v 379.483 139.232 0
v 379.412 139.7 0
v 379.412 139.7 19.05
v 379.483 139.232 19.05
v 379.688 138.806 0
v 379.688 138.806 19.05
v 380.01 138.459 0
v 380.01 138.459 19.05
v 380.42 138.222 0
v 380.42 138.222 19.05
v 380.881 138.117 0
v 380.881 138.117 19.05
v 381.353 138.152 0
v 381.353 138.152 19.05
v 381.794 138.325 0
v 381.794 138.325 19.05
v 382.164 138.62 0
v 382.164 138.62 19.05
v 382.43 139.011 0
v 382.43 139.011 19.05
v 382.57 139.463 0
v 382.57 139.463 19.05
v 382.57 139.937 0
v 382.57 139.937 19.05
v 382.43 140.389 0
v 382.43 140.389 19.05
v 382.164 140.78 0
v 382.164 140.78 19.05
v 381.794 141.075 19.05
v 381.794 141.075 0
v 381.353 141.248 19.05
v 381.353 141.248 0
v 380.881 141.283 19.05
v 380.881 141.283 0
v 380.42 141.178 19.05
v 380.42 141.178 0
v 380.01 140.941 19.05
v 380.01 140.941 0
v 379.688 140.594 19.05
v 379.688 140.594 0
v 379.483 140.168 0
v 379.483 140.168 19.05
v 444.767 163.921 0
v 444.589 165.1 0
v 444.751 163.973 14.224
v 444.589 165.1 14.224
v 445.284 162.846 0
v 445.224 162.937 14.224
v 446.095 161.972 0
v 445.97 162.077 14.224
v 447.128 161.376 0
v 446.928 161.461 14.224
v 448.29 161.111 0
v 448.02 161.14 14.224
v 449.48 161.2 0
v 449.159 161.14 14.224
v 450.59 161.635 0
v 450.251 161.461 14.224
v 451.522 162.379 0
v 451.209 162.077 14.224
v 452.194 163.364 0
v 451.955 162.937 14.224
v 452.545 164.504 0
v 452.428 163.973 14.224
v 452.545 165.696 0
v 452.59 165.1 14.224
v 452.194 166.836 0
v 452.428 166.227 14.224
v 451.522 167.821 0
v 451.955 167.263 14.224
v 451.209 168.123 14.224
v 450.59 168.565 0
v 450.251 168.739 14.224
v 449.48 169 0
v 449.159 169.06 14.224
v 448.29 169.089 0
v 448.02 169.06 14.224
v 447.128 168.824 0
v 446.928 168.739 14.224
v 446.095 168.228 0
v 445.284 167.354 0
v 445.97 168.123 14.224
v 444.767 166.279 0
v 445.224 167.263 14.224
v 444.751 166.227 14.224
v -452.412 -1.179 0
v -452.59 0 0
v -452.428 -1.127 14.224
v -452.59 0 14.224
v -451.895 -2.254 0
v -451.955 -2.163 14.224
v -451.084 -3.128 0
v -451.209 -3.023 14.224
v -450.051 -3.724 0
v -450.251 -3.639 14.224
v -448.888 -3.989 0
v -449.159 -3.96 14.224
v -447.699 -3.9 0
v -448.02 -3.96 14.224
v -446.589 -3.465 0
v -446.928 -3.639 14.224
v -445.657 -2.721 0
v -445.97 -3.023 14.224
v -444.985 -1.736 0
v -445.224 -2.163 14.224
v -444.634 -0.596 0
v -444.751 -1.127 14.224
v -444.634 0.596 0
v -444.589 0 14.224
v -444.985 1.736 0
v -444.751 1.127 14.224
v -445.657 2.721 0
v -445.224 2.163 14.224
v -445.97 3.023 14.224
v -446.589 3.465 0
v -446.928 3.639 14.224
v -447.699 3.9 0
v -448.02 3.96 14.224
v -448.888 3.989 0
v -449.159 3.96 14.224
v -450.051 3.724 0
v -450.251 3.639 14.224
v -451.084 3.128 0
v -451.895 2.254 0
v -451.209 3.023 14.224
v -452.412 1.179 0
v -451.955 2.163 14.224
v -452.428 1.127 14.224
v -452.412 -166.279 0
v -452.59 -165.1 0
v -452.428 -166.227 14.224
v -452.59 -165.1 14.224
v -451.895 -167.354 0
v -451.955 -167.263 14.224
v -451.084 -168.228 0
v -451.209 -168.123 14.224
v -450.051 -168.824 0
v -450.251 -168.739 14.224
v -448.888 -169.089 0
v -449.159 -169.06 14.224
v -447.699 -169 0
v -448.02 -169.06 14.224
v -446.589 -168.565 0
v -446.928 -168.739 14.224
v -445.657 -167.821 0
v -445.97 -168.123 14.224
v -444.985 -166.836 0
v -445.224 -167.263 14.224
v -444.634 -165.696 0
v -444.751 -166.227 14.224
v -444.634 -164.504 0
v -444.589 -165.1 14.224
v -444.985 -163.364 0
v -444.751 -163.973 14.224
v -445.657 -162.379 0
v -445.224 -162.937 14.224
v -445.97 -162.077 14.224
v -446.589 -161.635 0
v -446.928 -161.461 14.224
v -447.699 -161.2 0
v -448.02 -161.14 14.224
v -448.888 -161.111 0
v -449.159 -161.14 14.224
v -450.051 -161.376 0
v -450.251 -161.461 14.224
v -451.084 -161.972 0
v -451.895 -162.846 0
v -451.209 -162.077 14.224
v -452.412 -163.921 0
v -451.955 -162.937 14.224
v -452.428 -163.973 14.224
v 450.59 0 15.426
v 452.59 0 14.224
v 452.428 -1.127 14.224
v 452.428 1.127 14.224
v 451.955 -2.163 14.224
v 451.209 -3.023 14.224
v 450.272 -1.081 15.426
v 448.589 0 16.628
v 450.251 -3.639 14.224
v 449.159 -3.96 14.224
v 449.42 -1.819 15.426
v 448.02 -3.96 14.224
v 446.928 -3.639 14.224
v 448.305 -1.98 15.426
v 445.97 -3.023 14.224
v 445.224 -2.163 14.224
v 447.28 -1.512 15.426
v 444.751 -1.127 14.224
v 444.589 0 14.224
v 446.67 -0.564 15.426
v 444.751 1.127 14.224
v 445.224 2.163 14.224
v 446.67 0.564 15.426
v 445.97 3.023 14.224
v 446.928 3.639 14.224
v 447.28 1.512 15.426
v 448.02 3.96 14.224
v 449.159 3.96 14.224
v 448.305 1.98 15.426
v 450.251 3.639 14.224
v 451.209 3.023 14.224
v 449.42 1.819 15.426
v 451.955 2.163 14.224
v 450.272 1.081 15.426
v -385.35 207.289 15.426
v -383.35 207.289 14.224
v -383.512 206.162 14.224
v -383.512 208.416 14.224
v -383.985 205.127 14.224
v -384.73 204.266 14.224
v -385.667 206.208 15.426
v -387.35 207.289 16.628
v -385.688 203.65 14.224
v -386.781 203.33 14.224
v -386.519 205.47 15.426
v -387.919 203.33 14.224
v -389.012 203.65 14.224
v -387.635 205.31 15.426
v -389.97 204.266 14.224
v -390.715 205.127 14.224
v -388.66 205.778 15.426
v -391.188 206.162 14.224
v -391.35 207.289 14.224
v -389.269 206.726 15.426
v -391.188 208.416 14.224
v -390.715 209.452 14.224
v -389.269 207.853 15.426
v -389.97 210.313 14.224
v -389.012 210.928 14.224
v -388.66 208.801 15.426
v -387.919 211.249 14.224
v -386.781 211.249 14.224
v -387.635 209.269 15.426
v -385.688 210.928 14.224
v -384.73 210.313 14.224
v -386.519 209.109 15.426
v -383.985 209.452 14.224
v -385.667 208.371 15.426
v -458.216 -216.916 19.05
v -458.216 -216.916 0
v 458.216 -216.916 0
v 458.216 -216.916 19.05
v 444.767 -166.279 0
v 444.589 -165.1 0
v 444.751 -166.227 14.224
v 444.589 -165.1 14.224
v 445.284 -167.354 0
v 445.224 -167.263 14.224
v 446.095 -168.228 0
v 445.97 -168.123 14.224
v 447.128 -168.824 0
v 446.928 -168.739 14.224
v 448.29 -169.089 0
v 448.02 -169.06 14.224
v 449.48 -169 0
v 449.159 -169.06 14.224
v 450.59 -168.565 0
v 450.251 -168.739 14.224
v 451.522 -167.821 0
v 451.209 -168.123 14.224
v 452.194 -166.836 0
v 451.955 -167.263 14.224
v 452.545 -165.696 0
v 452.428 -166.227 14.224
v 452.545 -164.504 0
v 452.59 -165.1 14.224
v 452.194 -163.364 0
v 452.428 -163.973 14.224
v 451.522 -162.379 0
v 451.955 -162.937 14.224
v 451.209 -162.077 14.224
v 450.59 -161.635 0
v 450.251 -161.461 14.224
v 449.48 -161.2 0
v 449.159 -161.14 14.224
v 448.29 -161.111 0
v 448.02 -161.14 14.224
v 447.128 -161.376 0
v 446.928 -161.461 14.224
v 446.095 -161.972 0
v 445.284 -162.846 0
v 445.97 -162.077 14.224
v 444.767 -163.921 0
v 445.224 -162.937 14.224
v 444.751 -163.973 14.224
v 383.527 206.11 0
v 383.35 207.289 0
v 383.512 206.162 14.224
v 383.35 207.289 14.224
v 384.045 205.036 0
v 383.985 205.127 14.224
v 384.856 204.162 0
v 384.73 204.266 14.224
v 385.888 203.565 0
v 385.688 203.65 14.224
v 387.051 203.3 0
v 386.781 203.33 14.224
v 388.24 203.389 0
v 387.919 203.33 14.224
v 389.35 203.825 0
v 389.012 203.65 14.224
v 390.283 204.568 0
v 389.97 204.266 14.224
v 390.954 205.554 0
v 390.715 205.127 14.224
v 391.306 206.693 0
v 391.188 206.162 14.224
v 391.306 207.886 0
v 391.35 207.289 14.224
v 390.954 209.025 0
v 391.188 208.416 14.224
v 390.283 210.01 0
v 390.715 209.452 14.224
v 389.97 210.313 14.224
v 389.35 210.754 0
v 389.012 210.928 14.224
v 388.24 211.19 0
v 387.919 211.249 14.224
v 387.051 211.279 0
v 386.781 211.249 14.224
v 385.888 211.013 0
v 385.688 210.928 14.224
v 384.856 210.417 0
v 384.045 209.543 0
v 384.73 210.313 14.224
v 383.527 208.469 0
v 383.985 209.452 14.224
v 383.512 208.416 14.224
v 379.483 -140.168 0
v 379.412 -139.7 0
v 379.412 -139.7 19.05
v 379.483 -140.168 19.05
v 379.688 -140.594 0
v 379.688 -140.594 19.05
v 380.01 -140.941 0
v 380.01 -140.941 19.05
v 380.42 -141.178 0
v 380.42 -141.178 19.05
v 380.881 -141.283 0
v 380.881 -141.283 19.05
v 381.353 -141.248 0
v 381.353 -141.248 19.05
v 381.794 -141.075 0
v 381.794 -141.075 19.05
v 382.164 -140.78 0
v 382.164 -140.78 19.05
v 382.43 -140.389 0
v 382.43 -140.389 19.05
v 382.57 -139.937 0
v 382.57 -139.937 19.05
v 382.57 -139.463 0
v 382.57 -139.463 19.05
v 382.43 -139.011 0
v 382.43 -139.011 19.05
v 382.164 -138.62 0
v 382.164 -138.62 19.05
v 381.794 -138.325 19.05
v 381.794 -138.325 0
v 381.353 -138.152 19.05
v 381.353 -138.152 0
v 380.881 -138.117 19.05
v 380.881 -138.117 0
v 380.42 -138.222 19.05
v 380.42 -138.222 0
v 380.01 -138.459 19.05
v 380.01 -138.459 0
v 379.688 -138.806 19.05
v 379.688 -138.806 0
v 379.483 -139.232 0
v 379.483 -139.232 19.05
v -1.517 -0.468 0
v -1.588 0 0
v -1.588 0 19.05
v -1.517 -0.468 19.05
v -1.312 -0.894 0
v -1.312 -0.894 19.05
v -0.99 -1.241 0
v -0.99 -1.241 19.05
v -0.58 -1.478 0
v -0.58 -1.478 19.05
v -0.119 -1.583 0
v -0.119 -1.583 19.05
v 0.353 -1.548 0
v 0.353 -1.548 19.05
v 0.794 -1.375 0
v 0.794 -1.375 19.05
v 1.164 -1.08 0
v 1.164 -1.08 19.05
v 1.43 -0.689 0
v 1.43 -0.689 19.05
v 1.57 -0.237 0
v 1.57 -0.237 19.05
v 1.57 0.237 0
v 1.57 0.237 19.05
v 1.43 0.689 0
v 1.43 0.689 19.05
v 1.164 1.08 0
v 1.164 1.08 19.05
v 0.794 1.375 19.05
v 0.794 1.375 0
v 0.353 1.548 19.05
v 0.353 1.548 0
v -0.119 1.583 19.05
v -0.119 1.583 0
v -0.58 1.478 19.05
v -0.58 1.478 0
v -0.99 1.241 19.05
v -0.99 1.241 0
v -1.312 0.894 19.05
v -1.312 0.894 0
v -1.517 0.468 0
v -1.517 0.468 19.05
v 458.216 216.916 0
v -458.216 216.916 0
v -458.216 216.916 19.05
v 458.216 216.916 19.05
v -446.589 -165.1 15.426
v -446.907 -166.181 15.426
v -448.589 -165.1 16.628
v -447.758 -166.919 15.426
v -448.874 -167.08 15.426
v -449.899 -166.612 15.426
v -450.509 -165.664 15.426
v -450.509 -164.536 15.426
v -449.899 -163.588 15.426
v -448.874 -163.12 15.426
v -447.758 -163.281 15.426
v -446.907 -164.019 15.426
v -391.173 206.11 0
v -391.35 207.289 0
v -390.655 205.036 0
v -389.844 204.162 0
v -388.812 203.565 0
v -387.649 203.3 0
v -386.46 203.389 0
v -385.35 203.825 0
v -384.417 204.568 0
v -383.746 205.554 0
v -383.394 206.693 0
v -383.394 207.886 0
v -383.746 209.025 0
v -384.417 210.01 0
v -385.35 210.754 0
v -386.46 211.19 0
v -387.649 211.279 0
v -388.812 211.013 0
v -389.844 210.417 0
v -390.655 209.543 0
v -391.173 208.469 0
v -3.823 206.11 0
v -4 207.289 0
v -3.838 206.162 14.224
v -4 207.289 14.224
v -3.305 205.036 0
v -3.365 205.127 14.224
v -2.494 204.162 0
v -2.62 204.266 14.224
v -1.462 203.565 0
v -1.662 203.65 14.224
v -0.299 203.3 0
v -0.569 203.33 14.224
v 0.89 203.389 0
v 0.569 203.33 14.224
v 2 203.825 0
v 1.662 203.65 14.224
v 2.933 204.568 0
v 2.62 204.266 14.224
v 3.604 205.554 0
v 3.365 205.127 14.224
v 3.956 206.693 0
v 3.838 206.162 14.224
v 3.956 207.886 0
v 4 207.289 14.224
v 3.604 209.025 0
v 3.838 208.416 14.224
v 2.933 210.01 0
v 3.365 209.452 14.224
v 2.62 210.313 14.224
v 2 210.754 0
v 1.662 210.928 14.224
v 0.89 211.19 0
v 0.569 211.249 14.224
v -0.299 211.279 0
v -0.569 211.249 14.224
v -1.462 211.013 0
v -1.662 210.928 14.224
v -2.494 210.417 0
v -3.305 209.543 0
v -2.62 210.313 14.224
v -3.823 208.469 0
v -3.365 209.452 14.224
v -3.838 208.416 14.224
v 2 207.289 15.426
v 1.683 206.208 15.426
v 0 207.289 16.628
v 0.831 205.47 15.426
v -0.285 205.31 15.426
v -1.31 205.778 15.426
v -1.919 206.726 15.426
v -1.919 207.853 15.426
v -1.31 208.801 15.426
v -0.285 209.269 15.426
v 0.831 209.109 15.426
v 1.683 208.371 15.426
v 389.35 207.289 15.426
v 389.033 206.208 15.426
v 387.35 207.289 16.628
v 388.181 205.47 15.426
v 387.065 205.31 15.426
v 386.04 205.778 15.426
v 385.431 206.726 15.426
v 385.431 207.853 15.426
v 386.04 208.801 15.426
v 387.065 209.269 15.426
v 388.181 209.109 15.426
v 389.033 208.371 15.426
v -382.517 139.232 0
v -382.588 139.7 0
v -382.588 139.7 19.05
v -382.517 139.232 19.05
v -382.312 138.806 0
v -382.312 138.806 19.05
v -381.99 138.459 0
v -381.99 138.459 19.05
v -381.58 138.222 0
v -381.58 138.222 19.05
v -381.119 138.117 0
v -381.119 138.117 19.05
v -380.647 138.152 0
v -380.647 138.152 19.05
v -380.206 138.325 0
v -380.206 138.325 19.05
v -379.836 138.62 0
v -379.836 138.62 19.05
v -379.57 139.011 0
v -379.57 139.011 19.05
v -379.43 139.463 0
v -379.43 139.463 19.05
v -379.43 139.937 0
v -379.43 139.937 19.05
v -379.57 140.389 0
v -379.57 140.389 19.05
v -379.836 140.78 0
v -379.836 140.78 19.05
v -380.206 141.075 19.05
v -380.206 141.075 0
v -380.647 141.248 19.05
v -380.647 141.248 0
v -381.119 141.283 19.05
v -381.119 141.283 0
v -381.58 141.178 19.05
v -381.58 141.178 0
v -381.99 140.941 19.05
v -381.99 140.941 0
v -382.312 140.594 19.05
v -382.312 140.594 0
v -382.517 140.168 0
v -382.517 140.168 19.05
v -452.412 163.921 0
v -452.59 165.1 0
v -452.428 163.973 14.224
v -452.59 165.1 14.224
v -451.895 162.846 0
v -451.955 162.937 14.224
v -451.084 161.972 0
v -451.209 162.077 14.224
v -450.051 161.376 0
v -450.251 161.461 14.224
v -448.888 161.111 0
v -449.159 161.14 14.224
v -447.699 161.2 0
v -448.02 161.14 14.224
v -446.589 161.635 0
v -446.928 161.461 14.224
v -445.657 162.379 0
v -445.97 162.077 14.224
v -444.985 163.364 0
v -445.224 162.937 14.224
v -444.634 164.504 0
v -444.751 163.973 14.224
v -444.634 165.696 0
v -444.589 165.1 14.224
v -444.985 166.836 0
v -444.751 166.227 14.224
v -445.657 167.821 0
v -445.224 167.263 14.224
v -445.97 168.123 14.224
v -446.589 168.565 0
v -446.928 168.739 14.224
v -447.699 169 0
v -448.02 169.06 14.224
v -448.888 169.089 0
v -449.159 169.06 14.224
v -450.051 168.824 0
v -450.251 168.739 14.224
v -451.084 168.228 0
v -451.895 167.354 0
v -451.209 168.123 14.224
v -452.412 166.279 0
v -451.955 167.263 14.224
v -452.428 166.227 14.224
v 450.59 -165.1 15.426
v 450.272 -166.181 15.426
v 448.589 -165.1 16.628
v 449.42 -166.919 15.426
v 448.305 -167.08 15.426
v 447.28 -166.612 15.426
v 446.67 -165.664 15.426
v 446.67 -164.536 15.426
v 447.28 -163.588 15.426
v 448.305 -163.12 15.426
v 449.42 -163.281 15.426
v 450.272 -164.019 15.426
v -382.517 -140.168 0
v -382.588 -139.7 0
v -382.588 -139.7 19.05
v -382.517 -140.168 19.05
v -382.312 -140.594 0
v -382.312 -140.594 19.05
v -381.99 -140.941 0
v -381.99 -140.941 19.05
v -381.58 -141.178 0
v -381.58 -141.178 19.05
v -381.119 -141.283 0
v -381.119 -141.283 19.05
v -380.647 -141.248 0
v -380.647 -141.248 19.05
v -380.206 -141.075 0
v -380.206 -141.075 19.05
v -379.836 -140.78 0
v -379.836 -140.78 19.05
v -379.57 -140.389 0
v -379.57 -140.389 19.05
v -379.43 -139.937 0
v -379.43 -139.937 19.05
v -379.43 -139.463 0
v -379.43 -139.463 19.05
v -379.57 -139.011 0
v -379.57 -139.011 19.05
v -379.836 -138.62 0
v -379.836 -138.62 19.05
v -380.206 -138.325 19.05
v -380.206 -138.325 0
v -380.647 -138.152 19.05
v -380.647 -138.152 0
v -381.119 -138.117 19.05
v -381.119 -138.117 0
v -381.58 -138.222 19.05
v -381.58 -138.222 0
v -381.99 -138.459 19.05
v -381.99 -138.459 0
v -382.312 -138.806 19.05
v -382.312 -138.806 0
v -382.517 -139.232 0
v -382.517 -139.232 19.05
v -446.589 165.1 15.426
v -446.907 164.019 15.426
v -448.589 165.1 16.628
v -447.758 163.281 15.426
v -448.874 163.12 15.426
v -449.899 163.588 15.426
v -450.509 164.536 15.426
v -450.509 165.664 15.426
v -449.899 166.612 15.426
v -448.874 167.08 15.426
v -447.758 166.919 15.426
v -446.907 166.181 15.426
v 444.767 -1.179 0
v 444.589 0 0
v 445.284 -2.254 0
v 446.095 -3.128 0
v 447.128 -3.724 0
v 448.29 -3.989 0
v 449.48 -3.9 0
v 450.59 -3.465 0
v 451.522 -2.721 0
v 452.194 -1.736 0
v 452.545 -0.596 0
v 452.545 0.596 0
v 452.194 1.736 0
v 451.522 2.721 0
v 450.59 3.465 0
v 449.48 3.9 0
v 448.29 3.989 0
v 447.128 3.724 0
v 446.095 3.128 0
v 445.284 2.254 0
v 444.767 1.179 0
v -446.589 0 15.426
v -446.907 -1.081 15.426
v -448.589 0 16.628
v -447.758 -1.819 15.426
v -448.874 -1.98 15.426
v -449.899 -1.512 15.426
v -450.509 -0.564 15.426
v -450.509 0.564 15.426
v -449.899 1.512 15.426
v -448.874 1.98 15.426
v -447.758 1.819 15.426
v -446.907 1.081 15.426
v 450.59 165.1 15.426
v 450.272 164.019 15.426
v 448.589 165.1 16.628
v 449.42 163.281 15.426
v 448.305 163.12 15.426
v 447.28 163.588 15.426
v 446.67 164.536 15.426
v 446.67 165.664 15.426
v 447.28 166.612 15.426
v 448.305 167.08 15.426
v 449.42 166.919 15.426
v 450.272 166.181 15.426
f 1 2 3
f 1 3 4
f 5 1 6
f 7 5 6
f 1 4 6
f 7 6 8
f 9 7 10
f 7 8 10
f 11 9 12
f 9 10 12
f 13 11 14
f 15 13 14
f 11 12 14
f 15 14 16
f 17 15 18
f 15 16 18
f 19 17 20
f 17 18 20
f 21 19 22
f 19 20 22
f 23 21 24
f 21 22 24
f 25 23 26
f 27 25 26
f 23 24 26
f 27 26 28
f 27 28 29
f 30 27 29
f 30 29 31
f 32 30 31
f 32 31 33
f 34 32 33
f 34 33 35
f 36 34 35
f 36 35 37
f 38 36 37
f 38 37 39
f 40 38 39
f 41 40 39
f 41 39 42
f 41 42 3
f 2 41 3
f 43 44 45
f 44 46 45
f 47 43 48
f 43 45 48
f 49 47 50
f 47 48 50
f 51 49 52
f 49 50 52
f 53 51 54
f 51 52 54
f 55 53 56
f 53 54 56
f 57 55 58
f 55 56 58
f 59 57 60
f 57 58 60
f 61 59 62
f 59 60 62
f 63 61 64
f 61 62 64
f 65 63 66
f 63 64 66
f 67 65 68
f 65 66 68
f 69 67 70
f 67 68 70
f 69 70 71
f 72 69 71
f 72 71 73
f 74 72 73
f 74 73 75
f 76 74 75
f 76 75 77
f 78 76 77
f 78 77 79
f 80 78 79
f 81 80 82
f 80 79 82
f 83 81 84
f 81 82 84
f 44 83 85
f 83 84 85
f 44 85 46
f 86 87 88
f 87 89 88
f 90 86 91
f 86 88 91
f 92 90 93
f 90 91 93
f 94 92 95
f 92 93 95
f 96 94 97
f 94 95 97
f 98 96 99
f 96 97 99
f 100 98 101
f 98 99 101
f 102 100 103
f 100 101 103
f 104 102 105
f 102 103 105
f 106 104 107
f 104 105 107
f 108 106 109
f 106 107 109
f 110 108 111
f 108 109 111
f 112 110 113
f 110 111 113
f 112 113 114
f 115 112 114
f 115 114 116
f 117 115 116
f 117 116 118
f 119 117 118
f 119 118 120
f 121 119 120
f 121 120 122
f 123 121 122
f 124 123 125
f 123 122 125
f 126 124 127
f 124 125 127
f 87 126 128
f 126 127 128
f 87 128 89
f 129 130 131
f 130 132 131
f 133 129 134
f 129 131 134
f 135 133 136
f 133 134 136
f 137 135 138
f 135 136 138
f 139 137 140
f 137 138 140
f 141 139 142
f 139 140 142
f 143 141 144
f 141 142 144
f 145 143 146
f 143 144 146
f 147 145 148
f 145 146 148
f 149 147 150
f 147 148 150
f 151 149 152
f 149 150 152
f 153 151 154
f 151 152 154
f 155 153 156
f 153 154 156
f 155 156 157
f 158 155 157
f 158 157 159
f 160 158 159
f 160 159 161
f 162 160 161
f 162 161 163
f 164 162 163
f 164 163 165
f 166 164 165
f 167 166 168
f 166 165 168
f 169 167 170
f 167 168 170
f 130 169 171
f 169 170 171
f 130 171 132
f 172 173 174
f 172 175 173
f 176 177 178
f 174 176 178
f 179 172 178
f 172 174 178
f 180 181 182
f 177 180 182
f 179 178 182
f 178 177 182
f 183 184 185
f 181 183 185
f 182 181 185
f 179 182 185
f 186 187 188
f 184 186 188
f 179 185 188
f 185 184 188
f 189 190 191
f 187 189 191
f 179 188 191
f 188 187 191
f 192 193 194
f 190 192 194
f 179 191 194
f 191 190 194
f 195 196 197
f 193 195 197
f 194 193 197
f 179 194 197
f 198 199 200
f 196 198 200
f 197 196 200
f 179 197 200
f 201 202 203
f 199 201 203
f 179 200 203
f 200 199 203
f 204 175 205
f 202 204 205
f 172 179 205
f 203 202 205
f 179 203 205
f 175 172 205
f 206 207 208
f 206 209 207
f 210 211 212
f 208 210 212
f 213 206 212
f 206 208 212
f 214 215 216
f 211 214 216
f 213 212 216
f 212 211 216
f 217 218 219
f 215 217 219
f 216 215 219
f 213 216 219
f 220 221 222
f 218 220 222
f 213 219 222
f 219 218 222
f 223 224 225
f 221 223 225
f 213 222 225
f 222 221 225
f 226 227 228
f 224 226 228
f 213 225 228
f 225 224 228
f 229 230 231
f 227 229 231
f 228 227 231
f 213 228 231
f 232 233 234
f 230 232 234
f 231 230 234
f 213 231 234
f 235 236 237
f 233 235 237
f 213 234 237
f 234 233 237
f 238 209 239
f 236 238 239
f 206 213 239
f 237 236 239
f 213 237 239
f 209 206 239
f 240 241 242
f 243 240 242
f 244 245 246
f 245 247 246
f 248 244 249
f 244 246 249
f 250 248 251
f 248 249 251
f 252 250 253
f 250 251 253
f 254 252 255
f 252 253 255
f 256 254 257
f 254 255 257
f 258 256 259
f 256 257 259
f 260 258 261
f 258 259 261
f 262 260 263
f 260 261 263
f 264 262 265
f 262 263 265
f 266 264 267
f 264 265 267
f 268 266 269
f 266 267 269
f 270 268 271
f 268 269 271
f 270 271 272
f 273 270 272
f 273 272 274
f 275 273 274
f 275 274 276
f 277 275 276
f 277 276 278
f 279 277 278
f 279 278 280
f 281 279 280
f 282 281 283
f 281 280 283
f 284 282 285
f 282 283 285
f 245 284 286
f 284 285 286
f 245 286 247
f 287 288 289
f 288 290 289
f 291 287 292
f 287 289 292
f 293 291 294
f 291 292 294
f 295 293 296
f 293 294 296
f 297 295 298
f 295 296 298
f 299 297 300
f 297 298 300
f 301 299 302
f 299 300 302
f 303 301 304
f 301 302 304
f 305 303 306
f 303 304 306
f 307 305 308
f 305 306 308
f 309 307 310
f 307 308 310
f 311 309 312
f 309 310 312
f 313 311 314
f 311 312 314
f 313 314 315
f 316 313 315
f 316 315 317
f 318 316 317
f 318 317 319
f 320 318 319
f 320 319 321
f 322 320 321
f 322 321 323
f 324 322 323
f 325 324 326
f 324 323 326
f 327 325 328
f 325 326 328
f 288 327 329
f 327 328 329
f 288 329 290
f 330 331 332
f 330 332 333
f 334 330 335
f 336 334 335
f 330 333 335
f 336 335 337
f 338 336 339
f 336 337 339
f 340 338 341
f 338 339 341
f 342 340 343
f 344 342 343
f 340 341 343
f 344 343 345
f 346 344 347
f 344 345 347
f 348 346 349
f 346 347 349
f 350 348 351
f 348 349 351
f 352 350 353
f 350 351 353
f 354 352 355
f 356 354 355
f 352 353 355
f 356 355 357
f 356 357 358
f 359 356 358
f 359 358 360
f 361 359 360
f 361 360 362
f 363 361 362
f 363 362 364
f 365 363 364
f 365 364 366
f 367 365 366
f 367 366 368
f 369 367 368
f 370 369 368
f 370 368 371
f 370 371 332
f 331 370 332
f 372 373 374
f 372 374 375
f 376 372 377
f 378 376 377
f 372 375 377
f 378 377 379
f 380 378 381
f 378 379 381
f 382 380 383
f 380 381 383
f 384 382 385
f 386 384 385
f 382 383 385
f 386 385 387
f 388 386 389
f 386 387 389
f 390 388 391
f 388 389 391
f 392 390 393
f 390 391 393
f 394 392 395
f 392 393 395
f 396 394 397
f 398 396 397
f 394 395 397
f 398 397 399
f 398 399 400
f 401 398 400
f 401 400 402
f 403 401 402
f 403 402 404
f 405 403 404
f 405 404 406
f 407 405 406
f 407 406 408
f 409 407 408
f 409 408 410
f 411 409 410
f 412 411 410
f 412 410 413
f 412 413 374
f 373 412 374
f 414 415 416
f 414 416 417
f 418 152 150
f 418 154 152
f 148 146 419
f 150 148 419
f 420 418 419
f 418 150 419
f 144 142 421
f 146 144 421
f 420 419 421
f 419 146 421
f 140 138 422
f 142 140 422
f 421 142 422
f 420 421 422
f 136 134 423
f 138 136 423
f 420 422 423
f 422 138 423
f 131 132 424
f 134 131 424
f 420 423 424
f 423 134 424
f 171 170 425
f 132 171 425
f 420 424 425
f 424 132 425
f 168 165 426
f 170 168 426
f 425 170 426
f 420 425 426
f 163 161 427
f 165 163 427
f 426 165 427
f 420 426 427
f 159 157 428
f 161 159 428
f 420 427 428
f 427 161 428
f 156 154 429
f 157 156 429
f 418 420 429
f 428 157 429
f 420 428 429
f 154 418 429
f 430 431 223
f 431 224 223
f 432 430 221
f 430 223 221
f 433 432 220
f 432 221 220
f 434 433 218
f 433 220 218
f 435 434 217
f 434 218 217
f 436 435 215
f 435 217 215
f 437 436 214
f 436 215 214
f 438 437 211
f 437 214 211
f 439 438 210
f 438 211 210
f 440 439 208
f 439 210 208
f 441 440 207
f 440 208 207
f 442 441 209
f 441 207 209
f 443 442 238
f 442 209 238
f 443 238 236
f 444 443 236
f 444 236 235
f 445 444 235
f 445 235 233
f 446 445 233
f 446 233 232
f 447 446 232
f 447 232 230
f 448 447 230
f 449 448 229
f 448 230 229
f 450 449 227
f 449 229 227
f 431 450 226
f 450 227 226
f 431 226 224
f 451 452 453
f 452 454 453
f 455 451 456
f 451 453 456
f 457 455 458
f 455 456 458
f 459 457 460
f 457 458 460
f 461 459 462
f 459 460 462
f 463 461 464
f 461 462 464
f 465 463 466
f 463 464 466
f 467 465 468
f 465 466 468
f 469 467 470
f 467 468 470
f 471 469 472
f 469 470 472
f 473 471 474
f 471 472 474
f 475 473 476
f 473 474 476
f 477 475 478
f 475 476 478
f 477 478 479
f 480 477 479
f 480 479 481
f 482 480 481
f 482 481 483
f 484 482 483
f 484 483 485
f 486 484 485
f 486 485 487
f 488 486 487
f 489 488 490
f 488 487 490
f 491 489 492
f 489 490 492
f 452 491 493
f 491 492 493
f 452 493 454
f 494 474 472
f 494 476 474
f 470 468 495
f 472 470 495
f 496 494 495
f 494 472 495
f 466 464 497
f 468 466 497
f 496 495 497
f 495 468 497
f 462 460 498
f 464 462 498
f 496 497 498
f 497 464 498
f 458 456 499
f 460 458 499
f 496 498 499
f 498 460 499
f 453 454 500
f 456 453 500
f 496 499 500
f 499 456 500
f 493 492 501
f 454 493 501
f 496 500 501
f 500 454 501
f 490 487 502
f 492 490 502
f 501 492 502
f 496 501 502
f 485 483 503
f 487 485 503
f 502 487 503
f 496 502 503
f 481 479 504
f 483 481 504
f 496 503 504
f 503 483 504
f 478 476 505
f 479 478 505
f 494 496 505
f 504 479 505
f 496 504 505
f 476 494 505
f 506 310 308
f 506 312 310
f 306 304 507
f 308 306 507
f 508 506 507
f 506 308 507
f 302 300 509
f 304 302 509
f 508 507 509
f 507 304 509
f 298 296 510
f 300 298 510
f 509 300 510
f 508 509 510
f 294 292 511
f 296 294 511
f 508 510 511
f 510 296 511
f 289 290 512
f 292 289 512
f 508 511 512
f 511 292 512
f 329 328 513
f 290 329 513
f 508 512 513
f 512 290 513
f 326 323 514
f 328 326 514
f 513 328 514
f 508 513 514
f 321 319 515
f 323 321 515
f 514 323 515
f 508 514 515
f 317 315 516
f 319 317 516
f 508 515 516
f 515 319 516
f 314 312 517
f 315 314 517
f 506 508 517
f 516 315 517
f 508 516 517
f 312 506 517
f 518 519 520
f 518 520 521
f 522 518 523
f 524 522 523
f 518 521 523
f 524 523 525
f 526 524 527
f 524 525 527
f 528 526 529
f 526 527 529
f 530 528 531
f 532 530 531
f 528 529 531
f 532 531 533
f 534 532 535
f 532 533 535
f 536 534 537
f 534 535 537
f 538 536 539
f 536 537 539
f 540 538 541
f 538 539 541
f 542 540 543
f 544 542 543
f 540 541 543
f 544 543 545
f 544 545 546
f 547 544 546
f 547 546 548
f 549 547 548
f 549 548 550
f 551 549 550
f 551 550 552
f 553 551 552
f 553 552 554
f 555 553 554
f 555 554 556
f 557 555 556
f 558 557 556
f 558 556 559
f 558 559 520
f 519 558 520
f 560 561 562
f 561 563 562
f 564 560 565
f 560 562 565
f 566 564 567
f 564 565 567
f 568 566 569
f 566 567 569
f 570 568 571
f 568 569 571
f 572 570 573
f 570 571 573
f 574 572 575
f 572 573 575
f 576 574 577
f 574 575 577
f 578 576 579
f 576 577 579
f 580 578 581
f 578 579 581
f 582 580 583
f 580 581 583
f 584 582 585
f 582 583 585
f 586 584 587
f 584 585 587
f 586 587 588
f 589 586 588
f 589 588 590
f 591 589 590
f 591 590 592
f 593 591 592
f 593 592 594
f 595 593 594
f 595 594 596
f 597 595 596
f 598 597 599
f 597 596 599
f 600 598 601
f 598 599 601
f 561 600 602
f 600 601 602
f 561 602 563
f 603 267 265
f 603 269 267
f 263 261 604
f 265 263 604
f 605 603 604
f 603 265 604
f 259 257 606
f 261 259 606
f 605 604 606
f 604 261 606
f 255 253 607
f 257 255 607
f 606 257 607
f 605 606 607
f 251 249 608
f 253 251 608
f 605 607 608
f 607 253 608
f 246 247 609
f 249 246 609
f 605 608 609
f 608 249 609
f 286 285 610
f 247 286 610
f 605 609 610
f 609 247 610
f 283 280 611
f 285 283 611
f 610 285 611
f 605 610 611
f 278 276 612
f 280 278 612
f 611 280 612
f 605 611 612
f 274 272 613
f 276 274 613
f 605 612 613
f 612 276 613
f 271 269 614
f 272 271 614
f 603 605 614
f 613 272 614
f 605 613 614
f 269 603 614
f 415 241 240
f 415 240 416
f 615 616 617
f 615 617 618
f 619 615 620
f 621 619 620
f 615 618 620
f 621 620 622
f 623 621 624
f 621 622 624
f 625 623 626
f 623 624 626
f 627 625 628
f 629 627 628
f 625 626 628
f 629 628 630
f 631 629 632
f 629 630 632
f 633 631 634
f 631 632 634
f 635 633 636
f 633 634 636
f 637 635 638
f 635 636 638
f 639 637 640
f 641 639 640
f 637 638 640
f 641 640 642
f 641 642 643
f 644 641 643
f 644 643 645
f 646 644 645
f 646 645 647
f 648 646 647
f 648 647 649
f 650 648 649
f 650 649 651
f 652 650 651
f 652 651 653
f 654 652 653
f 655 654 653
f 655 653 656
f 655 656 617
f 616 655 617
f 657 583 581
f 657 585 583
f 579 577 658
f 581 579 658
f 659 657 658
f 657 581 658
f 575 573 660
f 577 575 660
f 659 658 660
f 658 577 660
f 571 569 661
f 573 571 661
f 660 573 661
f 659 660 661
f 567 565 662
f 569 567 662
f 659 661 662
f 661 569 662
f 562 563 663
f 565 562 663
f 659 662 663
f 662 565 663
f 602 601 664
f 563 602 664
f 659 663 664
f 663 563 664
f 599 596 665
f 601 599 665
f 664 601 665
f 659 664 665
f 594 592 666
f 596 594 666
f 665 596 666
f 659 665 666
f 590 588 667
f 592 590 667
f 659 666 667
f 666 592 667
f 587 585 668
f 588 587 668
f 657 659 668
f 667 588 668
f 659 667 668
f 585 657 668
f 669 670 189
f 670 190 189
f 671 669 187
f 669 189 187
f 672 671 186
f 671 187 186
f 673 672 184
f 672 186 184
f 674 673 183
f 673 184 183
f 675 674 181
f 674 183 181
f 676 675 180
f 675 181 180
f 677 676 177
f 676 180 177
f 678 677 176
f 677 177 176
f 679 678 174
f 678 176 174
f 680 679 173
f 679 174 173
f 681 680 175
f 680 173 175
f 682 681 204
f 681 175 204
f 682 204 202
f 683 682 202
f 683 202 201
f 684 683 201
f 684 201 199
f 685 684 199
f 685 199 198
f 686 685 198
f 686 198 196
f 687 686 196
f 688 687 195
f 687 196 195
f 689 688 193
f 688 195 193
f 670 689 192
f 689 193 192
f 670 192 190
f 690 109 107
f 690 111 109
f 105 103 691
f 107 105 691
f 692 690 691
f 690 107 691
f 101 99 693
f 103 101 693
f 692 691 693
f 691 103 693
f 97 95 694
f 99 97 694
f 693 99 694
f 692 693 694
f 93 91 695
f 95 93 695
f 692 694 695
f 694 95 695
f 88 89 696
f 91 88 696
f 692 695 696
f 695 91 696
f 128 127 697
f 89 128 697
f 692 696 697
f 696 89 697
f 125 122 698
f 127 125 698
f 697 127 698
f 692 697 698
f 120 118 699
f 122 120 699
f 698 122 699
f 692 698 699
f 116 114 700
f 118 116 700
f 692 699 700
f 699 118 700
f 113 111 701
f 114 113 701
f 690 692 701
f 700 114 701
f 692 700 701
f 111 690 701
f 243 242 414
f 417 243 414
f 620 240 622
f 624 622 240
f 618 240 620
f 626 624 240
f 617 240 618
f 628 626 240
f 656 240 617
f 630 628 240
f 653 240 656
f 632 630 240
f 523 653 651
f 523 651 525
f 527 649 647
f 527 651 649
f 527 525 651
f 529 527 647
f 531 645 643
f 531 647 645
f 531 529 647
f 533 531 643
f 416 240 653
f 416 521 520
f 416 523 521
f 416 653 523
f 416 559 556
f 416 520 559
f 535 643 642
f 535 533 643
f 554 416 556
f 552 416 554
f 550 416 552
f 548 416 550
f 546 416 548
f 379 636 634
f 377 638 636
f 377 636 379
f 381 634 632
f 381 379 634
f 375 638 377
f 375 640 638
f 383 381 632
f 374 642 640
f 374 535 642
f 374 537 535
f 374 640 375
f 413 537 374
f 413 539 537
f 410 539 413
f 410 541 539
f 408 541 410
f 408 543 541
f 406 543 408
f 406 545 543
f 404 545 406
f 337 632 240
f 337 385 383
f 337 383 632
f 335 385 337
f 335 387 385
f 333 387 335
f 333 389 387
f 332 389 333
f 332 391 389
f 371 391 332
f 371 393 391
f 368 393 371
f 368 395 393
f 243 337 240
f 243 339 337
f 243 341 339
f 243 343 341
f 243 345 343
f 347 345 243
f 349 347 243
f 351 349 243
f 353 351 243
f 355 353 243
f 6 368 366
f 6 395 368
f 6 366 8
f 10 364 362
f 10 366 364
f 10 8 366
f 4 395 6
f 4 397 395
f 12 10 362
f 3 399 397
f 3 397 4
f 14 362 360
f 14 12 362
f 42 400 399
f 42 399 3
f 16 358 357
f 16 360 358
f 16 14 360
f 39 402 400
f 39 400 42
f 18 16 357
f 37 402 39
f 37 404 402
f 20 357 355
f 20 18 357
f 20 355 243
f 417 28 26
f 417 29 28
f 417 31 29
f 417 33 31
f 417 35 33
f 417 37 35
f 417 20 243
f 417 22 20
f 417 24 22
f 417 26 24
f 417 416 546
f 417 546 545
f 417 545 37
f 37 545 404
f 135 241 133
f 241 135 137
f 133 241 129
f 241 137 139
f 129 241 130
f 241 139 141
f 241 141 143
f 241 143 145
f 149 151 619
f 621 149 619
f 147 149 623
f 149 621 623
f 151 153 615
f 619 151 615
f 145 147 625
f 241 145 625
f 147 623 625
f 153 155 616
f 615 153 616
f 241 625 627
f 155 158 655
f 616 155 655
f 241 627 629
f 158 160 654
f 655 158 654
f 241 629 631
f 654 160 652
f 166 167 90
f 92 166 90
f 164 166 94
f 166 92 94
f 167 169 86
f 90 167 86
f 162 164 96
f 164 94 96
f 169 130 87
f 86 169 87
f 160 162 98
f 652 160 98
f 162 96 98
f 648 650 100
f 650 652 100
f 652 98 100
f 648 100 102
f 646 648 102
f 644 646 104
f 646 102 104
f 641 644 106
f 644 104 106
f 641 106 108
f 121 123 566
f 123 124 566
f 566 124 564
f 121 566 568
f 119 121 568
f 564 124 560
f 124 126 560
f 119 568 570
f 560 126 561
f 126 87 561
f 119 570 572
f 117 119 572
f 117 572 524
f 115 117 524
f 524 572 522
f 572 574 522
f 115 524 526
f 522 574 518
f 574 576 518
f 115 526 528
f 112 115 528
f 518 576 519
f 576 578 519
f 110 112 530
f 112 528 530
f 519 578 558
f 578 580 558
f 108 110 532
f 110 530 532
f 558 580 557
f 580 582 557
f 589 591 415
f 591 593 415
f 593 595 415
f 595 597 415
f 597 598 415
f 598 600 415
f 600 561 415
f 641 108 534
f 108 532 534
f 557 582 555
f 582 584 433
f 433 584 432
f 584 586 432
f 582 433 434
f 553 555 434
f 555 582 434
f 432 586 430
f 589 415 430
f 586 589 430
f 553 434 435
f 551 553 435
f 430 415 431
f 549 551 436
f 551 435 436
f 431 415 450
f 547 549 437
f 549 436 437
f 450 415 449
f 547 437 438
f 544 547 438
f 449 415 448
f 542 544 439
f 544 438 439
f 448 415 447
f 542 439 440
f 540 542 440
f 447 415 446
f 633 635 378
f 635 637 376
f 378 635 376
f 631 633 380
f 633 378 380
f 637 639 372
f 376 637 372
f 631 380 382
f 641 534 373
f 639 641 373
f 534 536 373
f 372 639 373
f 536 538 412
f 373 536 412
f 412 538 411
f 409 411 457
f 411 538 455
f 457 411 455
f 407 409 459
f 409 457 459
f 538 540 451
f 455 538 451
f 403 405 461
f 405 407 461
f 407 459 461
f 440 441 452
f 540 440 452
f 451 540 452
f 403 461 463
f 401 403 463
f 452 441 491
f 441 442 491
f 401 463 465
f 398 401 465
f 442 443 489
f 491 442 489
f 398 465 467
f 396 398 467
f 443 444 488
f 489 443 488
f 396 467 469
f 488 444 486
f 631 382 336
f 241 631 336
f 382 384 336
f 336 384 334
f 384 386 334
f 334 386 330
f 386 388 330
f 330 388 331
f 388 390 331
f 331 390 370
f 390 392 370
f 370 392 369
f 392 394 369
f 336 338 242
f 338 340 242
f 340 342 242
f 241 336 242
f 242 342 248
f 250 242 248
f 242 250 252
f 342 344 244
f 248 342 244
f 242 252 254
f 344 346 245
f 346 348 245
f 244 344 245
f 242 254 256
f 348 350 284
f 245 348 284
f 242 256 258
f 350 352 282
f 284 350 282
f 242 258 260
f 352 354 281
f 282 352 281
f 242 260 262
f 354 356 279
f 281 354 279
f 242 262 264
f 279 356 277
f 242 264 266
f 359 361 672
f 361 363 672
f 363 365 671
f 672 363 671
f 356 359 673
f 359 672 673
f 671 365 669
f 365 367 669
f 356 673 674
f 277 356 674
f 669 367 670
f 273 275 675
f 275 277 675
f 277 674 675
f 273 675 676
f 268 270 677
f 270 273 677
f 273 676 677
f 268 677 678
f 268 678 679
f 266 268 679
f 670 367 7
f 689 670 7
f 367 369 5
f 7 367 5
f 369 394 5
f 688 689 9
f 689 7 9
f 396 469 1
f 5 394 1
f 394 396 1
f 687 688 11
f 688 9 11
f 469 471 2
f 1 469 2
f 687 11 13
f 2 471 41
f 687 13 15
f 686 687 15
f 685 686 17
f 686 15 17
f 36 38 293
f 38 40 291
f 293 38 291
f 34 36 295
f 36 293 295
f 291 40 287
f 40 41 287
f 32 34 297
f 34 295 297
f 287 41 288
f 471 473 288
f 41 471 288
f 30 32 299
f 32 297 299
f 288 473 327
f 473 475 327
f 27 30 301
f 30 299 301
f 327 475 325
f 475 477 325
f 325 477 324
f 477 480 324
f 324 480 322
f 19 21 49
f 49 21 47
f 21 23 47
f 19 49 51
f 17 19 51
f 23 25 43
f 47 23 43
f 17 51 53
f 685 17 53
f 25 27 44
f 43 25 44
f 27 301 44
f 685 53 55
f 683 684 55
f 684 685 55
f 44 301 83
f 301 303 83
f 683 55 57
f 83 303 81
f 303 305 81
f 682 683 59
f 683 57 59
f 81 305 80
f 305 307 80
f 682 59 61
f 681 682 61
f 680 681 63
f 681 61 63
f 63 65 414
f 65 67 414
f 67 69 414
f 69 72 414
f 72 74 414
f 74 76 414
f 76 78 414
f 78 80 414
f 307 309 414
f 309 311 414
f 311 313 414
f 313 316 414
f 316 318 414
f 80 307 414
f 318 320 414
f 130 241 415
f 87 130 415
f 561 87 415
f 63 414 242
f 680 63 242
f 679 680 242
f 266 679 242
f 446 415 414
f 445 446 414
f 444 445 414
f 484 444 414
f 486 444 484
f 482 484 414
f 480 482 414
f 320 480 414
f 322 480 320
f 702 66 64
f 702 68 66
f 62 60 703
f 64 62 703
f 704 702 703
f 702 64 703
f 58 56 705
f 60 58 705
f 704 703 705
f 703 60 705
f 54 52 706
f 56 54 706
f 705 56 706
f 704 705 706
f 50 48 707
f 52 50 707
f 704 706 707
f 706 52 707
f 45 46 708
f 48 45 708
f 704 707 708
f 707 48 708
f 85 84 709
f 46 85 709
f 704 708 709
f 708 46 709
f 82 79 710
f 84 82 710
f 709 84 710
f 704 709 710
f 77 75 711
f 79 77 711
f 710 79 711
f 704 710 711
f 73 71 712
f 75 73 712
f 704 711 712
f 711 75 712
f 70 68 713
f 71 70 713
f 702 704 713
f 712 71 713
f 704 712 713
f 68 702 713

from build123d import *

# Parameters (mm, degrees)
F0_W     = 916.432
F0_H     = 433.832
F1_DEPTH = 19.05
F3_D     = 8.001
F3_DEPTH = 14.224
F3_TIP   = 2.4037429064
F5_D     = 3.175
F5_DEPTH = 20.32
F5_TIP   = 0.9538662327


with BuildPart() as f1:
    # F0 (on Top) → F1 (new body)
    with BuildSketch(Plane.XY):
        Rectangle(F0_W, F0_H)
    extrude(amount=F1_DEPTH)

    # F3
    with Locations(Plane(origin=(0, 0, 0), x_dir=(1, 0, 0), z_dir=(0, 0, -1))):
        with Locations((-448.5894, 165.1), (-448.5894, 0), (-448.5894, -165.1), (-387.35, -207.2894), (0, -207.2894), (387.35, -207.2894), (448.5894, -165.1), (448.5894, 0), (448.5894, 165.1)):
            Hole(F3_D / 2, depth=F3_DEPTH)
            with Locations((0, 0, -(F3_DEPTH + F3_TIP / 2))):  # 118° drill point
                Cone(0, F3_D / 2, F3_TIP, mode=Mode.SUBTRACT)

    # F5
    with Locations(Plane(origin=(0, 0, 0), x_dir=(1, 0, 0), z_dir=(0, 0, -1))):
        with Locations((-381, 139.7), (0, 0), (-381, -139.7), (381, -139.7), (381, 139.7)):
            Hole(F5_D / 2, depth=F5_DEPTH)
            with Locations((0, 0, -(F5_DEPTH + F5_TIP / 2))):  # 118° drill point
                Cone(0, F5_D / 2, F5_TIP, mode=Mode.SUBTRACT)


solid = f1.part
